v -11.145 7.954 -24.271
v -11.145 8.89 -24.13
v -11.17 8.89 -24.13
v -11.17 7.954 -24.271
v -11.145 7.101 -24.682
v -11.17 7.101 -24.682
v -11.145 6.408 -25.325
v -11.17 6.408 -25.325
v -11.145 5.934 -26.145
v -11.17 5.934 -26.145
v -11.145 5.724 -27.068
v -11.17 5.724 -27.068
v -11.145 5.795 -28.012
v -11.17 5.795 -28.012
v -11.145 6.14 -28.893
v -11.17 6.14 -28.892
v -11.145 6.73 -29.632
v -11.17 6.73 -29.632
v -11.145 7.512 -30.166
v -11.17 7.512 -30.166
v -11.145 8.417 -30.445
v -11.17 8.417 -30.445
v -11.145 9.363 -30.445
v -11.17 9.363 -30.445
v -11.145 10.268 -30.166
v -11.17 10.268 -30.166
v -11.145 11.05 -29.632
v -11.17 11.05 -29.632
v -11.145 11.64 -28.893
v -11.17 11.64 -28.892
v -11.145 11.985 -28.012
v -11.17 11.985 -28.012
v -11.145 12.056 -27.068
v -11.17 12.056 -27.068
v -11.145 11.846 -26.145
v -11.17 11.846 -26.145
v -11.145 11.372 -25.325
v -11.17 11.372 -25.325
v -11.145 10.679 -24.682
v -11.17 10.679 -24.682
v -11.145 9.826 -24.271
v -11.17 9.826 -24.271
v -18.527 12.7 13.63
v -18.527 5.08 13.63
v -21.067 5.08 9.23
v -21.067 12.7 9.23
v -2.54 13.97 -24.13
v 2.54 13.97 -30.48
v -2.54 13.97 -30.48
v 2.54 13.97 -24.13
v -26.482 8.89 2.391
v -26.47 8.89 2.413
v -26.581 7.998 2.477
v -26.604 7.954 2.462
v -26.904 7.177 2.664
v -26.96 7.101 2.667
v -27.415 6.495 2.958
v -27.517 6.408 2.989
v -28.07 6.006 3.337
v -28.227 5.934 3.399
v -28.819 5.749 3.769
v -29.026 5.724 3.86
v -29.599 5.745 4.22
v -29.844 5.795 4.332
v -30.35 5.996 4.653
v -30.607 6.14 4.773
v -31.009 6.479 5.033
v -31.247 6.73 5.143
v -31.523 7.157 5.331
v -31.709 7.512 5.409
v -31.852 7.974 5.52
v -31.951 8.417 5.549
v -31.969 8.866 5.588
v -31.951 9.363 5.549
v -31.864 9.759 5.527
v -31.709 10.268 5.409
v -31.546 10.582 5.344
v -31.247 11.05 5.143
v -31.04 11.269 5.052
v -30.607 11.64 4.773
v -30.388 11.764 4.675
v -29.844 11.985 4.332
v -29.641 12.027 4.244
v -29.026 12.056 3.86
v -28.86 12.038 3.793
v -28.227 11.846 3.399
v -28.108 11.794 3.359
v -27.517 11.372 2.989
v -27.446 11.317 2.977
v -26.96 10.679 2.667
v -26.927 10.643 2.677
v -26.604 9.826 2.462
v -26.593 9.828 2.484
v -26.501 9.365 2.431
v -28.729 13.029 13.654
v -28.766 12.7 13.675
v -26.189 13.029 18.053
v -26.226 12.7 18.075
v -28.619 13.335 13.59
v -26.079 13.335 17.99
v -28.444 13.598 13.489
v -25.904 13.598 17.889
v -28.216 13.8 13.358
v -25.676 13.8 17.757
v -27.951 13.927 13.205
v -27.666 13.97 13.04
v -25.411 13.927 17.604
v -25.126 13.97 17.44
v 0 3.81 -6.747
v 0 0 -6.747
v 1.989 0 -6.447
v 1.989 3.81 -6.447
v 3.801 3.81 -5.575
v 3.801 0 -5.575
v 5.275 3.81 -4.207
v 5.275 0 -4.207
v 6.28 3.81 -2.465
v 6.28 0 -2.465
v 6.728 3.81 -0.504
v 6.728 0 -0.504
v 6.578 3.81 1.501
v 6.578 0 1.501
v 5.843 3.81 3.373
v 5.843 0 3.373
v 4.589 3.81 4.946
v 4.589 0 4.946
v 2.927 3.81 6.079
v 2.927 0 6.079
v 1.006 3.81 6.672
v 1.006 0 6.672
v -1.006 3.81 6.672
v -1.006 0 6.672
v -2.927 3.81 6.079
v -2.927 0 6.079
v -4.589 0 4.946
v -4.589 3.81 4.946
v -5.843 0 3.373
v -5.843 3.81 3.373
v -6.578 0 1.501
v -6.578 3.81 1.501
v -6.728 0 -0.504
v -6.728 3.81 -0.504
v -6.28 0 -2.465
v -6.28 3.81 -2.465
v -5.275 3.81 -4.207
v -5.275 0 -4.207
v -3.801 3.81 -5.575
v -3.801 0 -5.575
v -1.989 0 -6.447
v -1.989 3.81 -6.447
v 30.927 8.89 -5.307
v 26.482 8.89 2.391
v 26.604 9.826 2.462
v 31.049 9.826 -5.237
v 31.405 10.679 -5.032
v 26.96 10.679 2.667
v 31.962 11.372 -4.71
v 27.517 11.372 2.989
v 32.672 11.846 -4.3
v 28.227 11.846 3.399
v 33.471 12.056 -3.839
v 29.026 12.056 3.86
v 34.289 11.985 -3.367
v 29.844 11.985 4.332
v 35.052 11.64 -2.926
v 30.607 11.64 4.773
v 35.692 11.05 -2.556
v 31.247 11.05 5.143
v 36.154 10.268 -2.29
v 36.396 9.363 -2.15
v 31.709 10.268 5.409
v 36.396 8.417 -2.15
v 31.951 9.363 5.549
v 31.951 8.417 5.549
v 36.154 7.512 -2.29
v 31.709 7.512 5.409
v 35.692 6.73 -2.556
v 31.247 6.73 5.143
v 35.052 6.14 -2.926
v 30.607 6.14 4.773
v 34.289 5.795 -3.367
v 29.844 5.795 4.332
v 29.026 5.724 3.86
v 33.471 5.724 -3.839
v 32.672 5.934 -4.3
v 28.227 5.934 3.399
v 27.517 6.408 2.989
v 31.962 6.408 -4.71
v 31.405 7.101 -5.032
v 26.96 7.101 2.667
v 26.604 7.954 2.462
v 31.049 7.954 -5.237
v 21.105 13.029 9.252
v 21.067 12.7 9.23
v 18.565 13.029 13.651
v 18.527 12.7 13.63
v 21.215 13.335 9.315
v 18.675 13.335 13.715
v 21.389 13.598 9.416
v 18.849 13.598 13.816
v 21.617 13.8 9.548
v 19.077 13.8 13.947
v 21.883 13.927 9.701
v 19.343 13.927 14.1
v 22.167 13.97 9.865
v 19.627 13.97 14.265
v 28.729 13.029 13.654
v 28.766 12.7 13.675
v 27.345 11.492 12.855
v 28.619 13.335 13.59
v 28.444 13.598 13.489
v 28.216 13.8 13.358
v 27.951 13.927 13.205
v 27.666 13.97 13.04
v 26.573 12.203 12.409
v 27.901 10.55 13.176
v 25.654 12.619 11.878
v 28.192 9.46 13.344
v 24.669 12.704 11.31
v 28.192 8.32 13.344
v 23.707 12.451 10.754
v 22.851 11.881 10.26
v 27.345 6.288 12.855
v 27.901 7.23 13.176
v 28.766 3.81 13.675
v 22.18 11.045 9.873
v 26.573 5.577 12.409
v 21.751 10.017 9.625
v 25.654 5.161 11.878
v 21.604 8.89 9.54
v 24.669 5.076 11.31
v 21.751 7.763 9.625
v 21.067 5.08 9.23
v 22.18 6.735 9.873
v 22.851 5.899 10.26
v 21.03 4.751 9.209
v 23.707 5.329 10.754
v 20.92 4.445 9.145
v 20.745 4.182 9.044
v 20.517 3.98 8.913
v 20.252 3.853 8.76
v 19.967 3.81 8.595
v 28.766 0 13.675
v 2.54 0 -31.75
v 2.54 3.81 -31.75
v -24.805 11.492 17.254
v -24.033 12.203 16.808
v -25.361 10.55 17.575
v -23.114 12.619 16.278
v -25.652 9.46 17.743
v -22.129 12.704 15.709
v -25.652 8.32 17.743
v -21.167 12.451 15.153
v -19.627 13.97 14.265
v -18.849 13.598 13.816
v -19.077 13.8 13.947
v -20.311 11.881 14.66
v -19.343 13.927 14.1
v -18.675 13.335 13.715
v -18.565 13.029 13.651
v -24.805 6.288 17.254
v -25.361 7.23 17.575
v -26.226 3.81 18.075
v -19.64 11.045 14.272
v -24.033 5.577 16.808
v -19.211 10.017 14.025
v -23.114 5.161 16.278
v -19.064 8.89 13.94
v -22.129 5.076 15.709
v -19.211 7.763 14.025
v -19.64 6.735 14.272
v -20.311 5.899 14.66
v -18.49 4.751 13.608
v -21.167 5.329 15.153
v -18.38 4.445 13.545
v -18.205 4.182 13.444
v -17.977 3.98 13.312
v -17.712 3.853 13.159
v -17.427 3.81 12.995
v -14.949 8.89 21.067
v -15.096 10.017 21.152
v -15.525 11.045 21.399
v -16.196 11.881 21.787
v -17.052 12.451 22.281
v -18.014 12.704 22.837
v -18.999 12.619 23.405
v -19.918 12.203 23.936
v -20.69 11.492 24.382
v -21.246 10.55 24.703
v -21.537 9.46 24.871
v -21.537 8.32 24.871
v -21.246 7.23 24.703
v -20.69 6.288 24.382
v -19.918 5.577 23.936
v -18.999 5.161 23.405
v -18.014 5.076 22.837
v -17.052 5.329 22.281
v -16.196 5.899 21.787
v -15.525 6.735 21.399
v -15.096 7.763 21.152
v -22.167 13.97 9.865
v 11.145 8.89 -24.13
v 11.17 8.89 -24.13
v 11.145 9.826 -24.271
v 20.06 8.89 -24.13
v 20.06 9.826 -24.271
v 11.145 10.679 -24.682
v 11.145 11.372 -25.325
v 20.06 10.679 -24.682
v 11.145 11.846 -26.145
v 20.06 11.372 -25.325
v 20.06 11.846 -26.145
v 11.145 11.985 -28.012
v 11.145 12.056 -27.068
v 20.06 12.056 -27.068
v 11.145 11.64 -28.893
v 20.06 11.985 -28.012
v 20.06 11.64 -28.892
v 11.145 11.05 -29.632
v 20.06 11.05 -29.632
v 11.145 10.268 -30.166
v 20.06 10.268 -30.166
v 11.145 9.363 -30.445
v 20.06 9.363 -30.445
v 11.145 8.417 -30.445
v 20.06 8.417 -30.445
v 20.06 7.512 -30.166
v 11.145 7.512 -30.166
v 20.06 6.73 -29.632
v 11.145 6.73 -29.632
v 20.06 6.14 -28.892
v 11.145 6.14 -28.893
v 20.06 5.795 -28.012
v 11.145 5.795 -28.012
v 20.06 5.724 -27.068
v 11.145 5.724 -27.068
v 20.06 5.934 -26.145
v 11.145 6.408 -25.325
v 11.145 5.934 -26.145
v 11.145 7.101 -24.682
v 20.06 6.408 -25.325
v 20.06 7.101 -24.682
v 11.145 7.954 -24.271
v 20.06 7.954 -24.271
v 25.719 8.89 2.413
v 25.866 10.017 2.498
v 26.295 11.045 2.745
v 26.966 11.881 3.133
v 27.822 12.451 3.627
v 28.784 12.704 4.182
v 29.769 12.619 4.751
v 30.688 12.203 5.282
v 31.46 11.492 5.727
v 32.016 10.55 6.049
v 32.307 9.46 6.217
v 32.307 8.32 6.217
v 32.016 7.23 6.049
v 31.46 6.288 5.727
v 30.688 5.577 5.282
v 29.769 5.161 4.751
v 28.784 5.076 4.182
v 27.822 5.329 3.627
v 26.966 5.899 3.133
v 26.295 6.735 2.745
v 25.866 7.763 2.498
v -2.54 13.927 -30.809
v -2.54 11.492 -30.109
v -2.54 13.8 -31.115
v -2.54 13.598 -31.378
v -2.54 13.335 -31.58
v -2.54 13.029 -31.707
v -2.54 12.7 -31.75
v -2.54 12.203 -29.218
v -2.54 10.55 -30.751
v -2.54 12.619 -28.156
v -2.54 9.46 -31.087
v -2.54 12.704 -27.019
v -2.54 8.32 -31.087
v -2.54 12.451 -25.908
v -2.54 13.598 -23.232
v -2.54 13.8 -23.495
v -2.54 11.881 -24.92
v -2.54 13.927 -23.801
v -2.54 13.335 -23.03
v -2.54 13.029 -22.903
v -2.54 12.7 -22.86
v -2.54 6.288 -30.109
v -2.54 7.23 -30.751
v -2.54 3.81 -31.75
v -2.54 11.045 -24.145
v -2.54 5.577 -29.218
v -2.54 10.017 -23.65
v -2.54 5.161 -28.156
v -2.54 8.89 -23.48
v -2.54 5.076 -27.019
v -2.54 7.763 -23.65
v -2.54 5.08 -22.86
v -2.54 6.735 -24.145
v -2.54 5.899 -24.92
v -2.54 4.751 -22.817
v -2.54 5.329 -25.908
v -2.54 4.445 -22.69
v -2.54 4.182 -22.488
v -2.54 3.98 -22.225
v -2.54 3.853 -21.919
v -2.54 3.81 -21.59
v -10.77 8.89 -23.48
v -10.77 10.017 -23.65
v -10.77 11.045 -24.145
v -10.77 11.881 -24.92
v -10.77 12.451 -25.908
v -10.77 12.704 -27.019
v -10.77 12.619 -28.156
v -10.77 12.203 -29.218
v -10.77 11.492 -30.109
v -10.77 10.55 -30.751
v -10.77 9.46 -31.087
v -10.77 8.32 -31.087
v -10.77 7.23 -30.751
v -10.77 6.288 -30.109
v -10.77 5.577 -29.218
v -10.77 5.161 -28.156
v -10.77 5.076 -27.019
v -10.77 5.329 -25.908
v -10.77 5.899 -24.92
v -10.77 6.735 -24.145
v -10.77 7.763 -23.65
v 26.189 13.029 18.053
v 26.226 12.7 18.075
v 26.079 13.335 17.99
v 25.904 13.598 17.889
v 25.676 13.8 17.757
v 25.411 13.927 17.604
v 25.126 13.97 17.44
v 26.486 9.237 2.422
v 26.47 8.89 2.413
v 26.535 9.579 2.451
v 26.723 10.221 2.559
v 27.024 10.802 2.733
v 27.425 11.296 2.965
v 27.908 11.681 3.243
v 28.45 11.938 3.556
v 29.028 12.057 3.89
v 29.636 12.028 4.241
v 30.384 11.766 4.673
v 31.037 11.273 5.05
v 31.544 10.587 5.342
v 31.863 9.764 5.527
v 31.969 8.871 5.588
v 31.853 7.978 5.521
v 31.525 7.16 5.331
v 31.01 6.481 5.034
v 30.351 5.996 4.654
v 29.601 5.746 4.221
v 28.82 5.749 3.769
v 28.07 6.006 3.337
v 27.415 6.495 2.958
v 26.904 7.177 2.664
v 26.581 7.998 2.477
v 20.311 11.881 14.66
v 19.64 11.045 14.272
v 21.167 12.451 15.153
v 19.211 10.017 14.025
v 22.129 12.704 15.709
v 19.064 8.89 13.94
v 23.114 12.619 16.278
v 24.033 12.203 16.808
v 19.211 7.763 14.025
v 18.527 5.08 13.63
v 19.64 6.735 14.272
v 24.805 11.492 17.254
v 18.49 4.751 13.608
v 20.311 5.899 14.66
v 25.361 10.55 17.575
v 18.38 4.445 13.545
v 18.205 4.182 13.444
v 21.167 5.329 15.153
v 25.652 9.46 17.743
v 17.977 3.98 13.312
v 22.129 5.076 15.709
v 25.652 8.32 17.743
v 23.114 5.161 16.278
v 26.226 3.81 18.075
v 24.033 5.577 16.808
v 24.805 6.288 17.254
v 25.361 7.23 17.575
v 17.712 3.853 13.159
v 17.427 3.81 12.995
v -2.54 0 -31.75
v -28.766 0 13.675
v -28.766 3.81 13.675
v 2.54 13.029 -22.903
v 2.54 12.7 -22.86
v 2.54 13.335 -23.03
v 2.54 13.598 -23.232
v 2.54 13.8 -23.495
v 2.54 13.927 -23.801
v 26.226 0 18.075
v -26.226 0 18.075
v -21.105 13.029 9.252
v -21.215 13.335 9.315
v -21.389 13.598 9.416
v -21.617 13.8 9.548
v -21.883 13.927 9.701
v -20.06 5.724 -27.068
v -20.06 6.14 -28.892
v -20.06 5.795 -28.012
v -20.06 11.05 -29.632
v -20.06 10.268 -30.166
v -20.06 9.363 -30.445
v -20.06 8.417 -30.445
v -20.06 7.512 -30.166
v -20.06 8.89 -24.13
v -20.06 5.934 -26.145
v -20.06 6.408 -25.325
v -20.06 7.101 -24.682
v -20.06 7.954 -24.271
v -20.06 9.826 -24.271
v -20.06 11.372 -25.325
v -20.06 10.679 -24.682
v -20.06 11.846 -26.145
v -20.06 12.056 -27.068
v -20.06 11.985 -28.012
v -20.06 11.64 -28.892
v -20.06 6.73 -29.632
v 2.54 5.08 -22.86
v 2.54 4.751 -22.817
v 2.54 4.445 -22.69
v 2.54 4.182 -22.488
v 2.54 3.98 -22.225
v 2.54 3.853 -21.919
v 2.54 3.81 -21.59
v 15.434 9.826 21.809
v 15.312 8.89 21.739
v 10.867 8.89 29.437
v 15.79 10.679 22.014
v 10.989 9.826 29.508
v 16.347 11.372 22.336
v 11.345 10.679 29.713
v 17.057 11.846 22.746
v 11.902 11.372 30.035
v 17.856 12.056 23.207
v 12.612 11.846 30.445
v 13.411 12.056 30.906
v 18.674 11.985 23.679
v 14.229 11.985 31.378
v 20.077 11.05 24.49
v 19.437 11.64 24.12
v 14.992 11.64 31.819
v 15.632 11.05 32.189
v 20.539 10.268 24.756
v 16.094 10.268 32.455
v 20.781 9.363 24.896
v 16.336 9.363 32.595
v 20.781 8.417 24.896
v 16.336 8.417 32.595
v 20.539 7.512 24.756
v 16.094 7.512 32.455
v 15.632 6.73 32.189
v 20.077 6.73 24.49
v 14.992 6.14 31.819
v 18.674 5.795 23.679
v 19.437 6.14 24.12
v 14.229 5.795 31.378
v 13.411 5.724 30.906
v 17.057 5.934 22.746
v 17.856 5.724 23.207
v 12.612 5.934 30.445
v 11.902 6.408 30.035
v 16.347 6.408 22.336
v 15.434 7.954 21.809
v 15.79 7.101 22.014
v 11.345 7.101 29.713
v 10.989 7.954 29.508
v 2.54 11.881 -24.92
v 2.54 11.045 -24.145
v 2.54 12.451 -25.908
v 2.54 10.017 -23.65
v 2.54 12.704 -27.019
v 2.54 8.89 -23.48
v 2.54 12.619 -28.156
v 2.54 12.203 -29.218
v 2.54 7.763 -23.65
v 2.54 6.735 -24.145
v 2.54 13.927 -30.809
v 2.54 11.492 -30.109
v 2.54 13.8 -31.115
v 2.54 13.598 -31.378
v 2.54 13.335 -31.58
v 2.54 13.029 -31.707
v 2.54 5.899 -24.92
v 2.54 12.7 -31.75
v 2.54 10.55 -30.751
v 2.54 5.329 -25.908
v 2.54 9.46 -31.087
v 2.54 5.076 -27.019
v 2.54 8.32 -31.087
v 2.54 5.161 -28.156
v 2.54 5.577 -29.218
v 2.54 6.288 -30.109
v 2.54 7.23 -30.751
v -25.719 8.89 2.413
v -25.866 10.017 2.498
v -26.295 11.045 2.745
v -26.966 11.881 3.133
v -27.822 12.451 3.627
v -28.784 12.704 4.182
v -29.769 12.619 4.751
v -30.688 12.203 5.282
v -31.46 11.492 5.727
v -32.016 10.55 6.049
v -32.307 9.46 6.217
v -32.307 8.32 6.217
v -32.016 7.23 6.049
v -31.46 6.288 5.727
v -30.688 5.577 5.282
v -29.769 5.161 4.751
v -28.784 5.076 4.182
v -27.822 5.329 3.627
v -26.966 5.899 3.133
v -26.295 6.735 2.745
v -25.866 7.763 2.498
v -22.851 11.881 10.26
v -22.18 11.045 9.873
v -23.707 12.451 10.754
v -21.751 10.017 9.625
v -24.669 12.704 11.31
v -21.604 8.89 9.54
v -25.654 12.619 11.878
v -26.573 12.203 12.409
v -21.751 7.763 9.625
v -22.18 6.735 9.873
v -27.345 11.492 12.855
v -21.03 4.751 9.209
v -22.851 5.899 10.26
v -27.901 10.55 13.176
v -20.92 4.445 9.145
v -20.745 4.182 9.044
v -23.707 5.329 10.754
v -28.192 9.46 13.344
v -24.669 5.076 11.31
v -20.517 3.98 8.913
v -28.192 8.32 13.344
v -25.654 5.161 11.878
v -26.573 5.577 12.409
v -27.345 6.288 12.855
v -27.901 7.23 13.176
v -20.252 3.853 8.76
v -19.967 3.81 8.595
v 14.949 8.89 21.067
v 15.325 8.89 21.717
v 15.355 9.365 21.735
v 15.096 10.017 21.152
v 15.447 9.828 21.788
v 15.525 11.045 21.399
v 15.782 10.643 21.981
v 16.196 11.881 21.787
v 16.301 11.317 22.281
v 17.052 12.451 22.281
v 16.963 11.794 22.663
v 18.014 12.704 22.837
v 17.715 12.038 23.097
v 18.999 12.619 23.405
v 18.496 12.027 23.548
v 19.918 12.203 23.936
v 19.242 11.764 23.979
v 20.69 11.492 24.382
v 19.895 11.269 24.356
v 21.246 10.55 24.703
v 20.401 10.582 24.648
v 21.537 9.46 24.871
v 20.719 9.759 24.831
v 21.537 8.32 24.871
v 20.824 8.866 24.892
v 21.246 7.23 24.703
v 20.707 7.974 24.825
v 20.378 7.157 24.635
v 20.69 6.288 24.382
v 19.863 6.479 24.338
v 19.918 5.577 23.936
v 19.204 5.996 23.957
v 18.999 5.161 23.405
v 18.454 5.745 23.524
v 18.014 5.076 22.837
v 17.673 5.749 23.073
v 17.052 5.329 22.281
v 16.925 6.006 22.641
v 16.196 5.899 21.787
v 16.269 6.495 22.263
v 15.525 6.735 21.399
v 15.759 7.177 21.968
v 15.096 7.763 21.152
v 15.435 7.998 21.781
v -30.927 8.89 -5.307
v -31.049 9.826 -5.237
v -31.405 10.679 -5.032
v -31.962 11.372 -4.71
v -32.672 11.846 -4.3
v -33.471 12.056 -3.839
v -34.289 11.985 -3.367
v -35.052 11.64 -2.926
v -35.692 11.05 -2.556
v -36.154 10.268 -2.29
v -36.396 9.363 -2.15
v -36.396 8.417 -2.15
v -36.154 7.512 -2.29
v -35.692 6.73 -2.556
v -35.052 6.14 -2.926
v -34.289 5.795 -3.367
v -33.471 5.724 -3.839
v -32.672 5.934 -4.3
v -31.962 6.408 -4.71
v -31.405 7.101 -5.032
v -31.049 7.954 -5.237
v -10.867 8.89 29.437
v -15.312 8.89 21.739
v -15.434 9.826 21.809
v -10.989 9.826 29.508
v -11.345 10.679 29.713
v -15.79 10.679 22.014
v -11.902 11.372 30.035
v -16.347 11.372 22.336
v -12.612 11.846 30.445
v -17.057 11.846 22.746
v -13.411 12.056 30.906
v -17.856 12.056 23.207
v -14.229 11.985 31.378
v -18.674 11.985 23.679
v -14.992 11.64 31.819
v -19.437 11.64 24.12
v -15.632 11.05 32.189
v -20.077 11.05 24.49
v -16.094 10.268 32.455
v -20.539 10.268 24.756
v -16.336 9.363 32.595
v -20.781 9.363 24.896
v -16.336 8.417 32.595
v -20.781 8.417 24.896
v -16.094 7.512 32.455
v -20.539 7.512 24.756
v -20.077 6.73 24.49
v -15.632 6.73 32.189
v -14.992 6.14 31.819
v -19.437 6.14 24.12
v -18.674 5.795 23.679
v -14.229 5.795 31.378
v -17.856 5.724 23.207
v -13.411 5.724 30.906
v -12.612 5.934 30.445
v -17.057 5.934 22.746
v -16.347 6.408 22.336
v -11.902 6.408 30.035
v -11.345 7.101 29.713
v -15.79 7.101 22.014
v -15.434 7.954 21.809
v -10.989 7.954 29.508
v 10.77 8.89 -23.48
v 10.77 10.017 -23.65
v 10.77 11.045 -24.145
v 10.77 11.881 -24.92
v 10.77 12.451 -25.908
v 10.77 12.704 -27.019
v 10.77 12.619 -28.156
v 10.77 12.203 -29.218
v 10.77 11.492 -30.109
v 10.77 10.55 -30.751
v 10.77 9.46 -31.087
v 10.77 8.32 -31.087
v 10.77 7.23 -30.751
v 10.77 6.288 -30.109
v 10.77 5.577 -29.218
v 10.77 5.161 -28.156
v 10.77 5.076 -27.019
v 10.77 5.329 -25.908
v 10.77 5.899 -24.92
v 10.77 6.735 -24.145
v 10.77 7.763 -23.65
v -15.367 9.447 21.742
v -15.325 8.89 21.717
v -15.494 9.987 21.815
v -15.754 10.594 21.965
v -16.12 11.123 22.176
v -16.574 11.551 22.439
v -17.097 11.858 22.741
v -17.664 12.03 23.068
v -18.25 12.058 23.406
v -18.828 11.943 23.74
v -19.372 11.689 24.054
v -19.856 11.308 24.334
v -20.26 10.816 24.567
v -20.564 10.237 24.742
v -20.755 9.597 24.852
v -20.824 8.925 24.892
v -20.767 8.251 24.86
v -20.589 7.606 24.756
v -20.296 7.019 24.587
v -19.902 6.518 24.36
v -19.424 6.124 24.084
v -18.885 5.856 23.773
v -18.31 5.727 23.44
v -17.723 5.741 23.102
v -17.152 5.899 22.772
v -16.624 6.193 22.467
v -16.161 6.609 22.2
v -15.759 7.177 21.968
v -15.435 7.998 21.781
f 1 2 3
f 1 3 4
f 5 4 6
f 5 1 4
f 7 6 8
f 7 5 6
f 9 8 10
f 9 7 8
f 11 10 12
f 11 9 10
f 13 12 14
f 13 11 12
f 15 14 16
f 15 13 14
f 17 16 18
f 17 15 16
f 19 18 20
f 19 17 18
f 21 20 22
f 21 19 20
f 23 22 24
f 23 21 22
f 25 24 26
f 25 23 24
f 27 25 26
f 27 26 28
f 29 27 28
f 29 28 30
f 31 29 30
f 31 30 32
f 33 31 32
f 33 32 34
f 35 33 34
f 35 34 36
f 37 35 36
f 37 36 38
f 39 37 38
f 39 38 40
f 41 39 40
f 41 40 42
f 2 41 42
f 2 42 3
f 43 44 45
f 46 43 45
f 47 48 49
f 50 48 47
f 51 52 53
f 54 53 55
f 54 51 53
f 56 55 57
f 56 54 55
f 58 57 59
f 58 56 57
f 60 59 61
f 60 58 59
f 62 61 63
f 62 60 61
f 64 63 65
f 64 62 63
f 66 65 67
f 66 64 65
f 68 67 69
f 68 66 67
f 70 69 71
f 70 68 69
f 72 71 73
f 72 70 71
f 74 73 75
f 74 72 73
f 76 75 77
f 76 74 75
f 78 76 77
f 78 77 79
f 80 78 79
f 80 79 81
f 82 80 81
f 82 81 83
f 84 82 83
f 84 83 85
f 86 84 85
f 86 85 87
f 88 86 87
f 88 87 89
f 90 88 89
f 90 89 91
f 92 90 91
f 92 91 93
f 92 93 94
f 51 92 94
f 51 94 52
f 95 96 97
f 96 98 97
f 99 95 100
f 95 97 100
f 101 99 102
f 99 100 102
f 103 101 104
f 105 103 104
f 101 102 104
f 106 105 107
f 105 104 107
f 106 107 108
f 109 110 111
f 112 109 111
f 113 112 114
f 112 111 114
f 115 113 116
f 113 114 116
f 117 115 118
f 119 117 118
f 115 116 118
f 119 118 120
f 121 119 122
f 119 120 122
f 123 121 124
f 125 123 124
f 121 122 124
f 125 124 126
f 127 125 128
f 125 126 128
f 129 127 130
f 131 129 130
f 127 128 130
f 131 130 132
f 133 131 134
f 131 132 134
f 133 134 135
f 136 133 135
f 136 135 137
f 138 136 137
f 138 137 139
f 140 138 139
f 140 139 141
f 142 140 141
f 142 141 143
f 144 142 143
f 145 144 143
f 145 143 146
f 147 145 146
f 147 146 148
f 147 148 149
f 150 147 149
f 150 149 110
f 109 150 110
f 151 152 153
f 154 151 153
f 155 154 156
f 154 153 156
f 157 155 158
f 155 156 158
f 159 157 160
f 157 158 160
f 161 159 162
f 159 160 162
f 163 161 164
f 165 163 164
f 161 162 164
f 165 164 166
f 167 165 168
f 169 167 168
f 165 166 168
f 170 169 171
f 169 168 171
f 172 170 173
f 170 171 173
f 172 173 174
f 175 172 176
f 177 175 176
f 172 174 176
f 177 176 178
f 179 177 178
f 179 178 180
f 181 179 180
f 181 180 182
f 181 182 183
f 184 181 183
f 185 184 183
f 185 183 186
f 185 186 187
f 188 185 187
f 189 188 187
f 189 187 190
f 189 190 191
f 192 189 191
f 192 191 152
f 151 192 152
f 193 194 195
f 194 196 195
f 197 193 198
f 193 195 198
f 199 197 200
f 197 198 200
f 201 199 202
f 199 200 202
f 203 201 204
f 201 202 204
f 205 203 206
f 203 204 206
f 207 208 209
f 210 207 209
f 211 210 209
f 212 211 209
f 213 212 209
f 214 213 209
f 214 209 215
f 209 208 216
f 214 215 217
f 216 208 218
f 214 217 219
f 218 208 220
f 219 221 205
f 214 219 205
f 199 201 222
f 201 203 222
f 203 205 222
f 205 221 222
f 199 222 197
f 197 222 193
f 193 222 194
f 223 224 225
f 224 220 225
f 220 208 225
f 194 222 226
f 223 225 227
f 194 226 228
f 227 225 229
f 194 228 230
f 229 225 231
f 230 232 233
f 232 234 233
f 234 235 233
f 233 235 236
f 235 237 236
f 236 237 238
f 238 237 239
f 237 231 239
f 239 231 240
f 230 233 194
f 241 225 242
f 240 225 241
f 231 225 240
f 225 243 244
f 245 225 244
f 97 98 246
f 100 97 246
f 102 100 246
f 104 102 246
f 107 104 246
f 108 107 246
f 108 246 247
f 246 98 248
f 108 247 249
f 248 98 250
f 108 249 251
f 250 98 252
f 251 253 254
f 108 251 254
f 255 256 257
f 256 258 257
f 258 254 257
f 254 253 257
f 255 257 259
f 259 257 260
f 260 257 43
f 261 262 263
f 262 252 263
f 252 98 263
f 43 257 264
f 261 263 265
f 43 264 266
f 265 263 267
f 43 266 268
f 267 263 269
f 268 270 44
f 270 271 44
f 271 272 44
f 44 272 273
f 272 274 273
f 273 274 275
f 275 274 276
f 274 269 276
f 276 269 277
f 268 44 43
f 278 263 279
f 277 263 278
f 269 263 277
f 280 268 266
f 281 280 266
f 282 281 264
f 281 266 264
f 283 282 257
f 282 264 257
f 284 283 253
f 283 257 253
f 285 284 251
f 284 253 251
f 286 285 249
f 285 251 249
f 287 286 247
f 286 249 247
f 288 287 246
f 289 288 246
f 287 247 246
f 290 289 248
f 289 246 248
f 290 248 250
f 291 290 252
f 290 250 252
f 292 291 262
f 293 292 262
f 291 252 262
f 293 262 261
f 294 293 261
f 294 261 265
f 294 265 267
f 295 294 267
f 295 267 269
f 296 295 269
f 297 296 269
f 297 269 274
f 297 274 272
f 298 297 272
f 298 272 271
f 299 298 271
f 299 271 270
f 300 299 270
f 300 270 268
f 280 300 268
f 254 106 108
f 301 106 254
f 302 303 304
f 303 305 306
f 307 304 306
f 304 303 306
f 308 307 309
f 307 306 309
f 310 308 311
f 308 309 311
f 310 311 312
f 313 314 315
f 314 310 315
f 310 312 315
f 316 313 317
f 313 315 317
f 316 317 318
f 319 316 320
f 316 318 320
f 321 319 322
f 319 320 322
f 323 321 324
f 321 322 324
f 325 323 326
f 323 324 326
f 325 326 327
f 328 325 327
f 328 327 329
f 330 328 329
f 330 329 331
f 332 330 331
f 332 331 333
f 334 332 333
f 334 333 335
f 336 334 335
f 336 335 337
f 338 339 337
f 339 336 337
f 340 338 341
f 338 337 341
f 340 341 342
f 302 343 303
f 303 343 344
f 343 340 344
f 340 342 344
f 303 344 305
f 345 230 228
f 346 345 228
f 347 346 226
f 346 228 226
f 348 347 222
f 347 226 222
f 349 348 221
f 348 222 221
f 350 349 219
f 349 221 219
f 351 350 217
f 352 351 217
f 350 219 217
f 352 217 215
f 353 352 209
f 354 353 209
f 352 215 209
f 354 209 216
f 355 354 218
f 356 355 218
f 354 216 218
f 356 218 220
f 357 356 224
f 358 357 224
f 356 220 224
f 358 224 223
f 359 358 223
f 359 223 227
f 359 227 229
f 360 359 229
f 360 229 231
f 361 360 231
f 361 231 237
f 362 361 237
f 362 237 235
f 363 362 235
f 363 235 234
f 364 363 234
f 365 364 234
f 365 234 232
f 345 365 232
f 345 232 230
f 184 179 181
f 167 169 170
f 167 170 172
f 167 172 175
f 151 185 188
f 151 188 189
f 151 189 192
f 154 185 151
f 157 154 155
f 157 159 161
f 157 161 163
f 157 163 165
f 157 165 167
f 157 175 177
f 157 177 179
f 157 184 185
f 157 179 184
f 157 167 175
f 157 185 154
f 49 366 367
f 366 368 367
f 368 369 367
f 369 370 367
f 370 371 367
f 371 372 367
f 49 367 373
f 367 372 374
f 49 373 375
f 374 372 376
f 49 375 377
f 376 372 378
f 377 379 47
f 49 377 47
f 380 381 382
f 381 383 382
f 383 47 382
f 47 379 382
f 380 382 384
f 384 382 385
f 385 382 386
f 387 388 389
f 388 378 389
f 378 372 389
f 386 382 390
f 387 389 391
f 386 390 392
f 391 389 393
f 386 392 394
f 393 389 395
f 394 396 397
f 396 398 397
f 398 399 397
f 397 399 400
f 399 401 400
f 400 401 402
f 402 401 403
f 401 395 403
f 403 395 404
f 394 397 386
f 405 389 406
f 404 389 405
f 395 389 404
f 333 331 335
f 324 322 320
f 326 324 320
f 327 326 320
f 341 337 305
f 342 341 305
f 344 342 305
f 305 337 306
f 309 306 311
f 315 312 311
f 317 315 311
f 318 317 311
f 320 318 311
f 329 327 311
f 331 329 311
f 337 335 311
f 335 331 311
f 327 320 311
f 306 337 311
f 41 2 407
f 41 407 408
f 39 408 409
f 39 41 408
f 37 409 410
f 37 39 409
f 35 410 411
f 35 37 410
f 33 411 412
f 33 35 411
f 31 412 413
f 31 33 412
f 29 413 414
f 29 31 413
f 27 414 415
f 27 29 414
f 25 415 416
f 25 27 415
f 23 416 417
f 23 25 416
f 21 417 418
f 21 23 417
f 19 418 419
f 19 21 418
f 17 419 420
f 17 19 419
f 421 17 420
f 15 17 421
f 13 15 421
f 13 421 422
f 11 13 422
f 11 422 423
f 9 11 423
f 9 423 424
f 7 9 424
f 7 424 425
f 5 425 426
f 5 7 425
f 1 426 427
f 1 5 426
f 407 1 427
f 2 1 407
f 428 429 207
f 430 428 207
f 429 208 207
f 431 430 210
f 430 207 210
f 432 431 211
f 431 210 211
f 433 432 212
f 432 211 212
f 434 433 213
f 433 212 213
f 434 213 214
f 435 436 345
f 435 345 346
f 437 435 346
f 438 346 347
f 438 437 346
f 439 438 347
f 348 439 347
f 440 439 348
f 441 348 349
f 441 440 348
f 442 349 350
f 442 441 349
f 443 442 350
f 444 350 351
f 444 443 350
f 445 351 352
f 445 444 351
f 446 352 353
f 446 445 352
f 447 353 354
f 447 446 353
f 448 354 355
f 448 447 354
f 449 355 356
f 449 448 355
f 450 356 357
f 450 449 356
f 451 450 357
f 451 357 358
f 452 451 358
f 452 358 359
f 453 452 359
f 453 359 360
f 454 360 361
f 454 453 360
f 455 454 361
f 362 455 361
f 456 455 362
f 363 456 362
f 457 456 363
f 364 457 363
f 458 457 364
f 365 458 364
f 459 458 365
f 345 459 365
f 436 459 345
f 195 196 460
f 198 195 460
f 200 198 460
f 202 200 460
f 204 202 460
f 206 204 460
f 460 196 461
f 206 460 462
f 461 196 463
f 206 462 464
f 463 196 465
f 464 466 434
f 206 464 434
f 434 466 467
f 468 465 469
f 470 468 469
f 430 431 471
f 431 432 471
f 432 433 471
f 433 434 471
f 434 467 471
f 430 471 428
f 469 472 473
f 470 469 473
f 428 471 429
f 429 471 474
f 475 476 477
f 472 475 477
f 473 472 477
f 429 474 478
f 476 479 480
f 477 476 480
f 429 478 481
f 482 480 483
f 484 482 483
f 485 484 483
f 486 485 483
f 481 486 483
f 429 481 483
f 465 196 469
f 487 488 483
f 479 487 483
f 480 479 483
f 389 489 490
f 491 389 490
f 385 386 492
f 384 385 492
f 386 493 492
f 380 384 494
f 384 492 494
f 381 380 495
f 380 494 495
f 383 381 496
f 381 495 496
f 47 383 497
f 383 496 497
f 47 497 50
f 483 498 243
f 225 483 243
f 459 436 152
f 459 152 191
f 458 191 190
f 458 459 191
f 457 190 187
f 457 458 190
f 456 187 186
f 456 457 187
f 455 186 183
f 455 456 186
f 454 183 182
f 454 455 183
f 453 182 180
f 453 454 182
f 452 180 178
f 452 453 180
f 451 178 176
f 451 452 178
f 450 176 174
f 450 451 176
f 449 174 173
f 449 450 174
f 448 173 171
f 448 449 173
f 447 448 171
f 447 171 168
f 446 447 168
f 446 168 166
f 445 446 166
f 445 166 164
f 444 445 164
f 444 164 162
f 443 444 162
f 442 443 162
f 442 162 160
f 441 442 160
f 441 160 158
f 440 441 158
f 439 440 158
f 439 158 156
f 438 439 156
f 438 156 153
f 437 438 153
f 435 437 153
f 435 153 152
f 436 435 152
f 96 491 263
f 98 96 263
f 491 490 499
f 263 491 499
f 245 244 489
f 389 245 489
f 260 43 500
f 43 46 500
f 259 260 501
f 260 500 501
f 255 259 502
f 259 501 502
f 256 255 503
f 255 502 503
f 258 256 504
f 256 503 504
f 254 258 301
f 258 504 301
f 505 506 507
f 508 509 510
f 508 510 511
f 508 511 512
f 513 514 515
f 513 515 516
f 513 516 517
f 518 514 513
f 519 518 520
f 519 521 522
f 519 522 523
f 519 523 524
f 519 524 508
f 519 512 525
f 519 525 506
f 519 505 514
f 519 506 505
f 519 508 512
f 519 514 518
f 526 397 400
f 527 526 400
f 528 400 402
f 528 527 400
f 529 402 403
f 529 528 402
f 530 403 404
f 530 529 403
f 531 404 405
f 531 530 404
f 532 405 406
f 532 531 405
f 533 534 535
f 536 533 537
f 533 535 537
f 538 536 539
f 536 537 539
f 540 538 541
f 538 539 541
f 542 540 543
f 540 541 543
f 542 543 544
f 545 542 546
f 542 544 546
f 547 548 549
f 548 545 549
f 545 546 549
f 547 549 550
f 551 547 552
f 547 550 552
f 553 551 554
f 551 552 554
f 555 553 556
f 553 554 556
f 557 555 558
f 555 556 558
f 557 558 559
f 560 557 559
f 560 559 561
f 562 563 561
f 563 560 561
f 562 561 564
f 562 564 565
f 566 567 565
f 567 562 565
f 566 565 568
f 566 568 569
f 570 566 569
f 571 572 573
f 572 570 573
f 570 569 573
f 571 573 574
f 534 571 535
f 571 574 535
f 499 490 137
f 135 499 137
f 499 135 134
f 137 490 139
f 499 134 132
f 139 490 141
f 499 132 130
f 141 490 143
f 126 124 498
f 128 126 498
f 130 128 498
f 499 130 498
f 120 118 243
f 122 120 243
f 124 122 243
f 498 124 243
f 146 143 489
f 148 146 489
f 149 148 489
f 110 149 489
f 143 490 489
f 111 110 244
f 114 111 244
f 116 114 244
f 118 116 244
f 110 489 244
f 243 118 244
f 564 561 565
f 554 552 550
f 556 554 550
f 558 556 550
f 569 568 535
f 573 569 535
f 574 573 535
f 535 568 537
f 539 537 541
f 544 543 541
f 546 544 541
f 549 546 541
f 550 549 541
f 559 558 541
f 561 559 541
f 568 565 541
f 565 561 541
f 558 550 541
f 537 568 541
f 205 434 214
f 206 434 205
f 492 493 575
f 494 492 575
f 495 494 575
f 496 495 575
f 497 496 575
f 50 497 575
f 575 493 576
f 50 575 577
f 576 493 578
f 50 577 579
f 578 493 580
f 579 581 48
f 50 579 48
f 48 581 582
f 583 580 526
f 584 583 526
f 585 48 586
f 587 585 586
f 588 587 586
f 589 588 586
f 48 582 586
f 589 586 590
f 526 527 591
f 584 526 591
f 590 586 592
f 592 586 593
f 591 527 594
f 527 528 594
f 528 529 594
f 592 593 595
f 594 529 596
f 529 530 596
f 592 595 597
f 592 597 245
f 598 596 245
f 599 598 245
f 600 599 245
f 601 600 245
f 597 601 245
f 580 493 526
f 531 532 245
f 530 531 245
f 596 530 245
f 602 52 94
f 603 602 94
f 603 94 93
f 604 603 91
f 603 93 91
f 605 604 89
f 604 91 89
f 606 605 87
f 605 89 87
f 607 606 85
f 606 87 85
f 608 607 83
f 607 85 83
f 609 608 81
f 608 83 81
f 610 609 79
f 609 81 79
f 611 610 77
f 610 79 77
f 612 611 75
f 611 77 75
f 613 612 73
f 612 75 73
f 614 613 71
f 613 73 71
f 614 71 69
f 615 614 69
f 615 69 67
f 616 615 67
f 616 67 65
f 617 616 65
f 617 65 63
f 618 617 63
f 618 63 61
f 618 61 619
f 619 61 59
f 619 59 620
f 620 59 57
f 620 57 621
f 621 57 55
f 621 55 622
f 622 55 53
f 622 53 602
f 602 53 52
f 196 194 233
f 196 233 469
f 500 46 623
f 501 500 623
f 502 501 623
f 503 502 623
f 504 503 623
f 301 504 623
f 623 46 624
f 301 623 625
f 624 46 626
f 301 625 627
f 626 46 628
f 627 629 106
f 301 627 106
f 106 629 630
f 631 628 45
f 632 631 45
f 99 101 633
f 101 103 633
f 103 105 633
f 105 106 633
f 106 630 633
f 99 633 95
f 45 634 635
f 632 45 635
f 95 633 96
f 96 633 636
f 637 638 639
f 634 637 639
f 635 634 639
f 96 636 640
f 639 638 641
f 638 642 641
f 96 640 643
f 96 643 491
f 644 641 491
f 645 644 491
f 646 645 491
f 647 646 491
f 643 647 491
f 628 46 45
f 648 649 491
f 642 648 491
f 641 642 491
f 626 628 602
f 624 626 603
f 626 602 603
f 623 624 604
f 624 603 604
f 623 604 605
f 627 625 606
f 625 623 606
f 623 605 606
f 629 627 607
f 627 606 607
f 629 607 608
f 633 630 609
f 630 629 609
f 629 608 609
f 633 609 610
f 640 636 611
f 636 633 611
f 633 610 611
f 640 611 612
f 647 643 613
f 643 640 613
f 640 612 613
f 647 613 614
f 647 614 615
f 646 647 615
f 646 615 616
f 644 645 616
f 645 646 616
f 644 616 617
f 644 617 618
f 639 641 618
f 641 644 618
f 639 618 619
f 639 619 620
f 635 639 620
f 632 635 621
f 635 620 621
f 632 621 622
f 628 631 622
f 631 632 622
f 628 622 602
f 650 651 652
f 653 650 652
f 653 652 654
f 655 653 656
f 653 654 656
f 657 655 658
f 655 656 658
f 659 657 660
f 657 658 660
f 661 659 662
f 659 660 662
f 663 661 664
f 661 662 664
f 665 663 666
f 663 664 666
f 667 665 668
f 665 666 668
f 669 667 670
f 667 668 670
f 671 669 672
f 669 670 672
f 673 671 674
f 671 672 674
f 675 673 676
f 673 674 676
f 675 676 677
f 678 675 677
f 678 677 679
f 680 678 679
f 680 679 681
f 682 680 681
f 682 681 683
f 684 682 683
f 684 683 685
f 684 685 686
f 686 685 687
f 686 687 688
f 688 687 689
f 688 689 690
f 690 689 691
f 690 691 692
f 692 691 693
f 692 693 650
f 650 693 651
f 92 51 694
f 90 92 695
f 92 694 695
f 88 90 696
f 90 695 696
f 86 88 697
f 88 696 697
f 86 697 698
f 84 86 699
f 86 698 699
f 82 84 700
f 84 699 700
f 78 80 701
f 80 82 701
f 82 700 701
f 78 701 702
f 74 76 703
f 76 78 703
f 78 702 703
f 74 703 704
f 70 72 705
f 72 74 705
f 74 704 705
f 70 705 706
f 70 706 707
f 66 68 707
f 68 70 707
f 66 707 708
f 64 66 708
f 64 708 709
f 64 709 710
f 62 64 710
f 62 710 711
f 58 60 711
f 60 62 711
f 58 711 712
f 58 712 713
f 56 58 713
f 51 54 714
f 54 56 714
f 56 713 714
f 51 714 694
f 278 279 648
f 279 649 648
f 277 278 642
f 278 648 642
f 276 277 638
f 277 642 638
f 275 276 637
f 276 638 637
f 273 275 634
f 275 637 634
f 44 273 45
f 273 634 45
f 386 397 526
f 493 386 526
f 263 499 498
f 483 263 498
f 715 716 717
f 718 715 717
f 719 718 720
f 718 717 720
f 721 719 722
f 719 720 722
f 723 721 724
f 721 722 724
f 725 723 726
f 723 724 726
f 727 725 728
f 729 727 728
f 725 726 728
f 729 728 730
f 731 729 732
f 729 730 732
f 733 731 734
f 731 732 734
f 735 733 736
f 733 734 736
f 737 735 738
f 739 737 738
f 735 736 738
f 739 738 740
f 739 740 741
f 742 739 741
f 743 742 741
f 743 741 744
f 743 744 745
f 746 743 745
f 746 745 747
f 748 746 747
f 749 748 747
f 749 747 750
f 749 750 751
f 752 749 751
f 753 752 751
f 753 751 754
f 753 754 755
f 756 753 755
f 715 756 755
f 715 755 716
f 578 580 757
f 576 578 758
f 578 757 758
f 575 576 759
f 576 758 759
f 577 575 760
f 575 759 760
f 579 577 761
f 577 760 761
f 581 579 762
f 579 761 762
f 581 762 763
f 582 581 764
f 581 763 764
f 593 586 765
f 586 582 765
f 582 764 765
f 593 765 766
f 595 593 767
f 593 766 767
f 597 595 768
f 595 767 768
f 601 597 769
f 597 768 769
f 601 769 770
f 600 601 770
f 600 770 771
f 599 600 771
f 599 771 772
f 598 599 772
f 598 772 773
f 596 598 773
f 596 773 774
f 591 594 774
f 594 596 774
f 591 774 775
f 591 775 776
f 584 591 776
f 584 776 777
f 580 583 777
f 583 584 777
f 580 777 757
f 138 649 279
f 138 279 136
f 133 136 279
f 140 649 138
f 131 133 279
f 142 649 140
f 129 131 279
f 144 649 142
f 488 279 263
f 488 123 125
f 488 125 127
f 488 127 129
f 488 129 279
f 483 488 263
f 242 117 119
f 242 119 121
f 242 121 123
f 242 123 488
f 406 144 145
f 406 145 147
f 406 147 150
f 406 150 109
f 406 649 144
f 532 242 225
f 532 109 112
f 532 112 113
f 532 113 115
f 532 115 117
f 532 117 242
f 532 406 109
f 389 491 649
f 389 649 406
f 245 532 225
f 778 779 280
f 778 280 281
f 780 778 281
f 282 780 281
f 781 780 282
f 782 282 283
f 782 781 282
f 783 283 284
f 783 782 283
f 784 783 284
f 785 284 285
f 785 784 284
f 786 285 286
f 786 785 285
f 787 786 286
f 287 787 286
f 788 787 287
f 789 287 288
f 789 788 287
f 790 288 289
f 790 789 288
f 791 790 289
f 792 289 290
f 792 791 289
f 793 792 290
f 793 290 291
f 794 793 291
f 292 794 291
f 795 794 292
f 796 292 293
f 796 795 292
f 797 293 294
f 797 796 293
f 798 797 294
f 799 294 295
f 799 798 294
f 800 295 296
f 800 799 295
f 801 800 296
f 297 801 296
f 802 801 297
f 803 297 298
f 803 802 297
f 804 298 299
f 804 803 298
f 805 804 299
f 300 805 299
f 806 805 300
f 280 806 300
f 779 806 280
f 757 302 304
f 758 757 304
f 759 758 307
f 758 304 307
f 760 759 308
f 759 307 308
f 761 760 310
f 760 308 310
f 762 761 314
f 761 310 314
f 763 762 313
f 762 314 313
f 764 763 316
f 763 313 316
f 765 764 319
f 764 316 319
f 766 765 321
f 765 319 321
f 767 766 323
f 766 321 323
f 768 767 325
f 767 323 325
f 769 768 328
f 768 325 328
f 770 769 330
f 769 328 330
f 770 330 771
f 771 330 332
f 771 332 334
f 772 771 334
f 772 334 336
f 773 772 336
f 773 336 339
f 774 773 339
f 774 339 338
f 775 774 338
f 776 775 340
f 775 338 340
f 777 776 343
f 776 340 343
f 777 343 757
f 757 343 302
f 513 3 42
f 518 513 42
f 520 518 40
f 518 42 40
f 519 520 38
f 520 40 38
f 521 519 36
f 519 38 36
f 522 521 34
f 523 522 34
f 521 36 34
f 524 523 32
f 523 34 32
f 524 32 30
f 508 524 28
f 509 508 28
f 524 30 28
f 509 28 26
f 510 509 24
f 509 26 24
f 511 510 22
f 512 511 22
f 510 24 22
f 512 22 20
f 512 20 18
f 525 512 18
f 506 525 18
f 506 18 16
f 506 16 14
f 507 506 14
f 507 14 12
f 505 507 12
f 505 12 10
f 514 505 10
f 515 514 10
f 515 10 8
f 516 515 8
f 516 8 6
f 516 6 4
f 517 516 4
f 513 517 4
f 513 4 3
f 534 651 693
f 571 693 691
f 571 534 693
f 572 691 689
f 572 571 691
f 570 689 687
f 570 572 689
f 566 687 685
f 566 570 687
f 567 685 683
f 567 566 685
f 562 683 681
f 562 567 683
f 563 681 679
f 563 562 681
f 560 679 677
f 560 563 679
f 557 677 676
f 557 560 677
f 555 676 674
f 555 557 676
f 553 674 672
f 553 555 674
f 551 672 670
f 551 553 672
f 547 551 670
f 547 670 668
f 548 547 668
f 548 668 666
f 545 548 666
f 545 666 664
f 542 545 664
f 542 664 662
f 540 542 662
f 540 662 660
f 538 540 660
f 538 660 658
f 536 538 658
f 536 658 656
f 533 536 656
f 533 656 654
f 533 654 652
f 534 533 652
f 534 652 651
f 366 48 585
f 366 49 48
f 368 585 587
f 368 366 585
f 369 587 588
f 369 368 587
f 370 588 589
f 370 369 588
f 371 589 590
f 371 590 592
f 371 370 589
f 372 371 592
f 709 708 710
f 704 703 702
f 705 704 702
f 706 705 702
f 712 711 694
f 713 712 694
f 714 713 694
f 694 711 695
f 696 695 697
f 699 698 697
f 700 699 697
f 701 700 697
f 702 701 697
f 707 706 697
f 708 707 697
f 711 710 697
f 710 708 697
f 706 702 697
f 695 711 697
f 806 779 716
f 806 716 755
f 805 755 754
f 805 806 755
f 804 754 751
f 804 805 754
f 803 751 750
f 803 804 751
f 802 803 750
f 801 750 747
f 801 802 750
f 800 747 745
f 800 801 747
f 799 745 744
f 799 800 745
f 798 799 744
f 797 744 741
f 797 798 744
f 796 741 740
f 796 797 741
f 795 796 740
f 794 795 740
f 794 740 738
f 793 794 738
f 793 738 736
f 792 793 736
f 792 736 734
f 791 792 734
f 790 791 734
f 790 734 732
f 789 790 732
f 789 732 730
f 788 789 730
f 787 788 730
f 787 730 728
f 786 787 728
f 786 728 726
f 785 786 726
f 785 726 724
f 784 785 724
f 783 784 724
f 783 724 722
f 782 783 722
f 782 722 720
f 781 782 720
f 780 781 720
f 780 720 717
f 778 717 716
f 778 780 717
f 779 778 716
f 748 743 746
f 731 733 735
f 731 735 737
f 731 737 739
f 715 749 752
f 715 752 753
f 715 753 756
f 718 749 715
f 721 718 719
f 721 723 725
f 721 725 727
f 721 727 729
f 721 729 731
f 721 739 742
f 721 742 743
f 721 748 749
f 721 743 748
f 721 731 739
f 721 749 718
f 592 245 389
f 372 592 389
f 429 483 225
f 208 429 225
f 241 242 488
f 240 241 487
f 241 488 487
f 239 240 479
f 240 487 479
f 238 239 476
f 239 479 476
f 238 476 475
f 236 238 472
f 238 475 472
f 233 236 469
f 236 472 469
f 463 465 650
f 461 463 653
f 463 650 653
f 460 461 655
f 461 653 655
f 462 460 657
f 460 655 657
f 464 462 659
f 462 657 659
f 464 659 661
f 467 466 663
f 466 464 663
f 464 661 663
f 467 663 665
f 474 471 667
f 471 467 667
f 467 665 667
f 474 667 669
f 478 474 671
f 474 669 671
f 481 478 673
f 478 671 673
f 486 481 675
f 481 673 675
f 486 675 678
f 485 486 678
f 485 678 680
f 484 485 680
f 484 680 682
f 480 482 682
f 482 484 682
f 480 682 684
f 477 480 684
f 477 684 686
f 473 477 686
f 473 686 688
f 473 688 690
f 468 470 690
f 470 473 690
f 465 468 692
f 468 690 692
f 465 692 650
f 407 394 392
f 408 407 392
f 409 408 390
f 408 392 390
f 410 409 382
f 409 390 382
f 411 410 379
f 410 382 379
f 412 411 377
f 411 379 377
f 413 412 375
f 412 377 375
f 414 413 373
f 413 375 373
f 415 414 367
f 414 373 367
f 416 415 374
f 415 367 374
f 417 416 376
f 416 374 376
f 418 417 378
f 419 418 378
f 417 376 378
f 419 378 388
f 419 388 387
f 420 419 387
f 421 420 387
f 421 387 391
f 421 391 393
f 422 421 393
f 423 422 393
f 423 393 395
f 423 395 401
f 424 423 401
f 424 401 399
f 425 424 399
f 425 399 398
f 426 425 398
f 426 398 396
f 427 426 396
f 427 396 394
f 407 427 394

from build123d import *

# Parameters (mm, degrees)
BOSS_EXTRUDE1_DEPTH              = 3.81
F_17_32_0_53125_DIAMETER_HOLE1_D = 13.49375
BOSS_EXTRUDE2_DEPTH              = 10.16
CIRPATTERN19_COUNT               = 3
BOSS_EXTRUDE3_START              = -13.71
SKETCH6_R                        = 3.825
BOSS_EXTRUDE3_DEPTH              = 22.34
BOSS_EXTRUDE4_START              = -31.23
SKETCH7_R                        = 3.175
BOSS_EXTRUDE4_DEPTH              = 40.12
CIRPATTERN21_COUNT               = 3
CIRPATTERN28_COUNT               = 3
CHAMFER3_SIZE                    = 0.4
CHAMFER3_SIZE_2                  = 0.692820323
FILLET4_R                        = 1.27


with BuildPart() as part:
    # Sketch1 → Boss-Extrude1 (new body)
    with BuildSketch(Plane(origin=(0, 0, 0), x_dir=(1, 0, 0), z_dir=(0, 1, 0))):
        Polygon((2.54, 31.75), (-2.54, 31.75), (-28.76630657, -13.675295474), (-26.22630657, -18.074704526), (26.22630657, -18.074704526), (28.76630657, -13.675295474), align=None)
    extrude(amount=BOSS_EXTRUDE1_DEPTH)

    # 17/32 (0.53125) Diameter Hole1 (through all)
    with Locations(Plane(origin=(-6.6e-08, 3.81, -3.86e-07), x_dir=(0, 0, 1), z_dir=(0, 1, 0))):
        with Locations((0, 0)):
            Hole(F_17_32_0_53125_DIAMETER_HOLE1_D / 2)

    # Sketch5 → Boss-Extrude2 (add)
    with BuildSketch(Plane(origin=(0, 3.81, 0), x_dir=(1, 0, 0), z_dir=(0, 1, 0))):
        Polygon((-21.067340731, -9.230295474), (-28.76630657, -13.675295474), (-26.22630657, -18.074704526), (-18.527340731, -13.629704526), align=None)
    boss_extrude2 = extrude(amount=BOSS_EXTRUDE2_DEPTH)

    # CirPattern19: Boss-Extrude2 ×3 about axis
    cirpattern19_axis = Axis((0, 0, 0), (0, 1, 0))
    for i in range(1, CIRPATTERN19_COUNT):
        add(boss_extrude2.rotate(cirpattern19_axis, i * 360 / CIRPATTERN19_COUNT))

    # Sketch6 → Boss-Extrude3 (add)
    with BuildSketch(Plane(origin=(1.27, 0, 2.199704526), x_dir=(0.8660254037844383, 0, -0.5000000000000007), z_dir=(0.5000000000000007, 0, 0.8660254037844383)).offset(BOSS_EXTRUDE3_START)):
        with Locations((-27.305, 8.89)):
            Circle(SKETCH6_R)
    boss_extrude3 = extrude(amount=BOSS_EXTRUDE3_DEPTH)

    # Sketch7 → Boss-Extrude4 (add)
    with BuildSketch(Plane(origin=(5.585, 0, 9.67350376), x_dir=(0.8660254037844384, 0, -0.5000000000000007), z_dir=(0.5000000000000007, 0, 0.8660254037844384)).offset(BOSS_EXTRUDE4_START)):
        with Locations((-27.305, 8.89)):
            Circle(SKETCH7_R)
    boss_extrude4 = extrude(amount=BOSS_EXTRUDE4_DEPTH)

    # CirPattern21: Boss-Extrude3 ×3 about axis
    cirpattern21_axis = Axis((0, 0, 0), (0, 1, 0))
    for i in range(1, CIRPATTERN21_COUNT):
        add(boss_extrude3.rotate(cirpattern21_axis, i * 360 / CIRPATTERN21_COUNT))

    # CirPattern28: Boss-Extrude4 ×3 about axis
    cirpattern28_axis = Axis((0, 0, 0), (0, 1, 0))
    for i in range(1, CIRPATTERN28_COUNT):
        add(boss_extrude4.rotate(cirpattern28_axis, i * 360 / CIRPATTERN28_COUNT))

    # Chamfer3
    # the kernel refuses this chamfer: 0.692820323, 0.4 mm, written as the material it takes off along each edge
    with BuildSketch(Plane(origin=(-18.06182365, 8.89, 23.32600376), x_dir=(0.8660254037844383, 0, -0.5000000000000004), z_dir=(0, -1, 0))) as chamfer3_piece_1_section:
        Polygon((3.825, -CHAMFER3_SIZE), (3.825 - CHAMFER3_SIZE_2, 0), (3.825, 0), align=None)
    chamfer3_piece_1 = revolve(axis=Axis((-18.06182365, 8.89, 23.32600376), (0.5000000000000007, 0, 0.8660254037844383)), mode=Mode.PRIVATE)
    chamfer3_piece_1 = chamfer3_piece_1 - Plane(origin=(-18.164887991, 8.89, 23.147491086), x_dir=(0.8660254037844384, 0, -0.5000000000000007), z_dir=(-0.5000000000000007, 0, -0.8660254037844384)) * Cylinder(3.175, 16, mode=Mode.PRIVATE)
    add(chamfer3_piece_1, mode=Mode.SUBTRACT)
    with BuildSketch(Plane(origin=(-11.17, 8.89, -27.305), x_dir=(0, 0, 1), z_dir=(0, -1, 0))) as chamfer3_piece_2_section:
        Polygon((3.825, -CHAMFER3_SIZE), (3.825 - CHAMFER3_SIZE_2, 0), (3.825, 0), align=None)
    chamfer3_piece_2 = revolve(axis=Axis((-11.17, 8.89, -27.305), (-1, 0, 0)), mode=Mode.PRIVATE)
    chamfer3_piece_2 = chamfer3_piece_2 - Plane(origin=(-10.963871319, 8.89, -27.305), x_dir=(0, 0, 1), z_dir=(1, 0, 0)) * Cylinder(3.175, 16, mode=Mode.PRIVATE)
    add(chamfer3_piece_2, mode=Mode.SUBTRACT)
    with BuildSketch(Plane(origin=(11.17, 8.89, -27.305), x_dir=(0, 0, 1), z_dir=(0, -1, 0))) as chamfer3_piece_3_section:
        Polygon((3.825, CHAMFER3_SIZE), (3.825 - CHAMFER3_SIZE_2, 0), (3.825, 0), align=None)
    chamfer3_piece_3 = revolve(axis=Axis((11.17, 8.89, -27.305), (-1, 0, 0)), mode=Mode.PRIVATE)
    chamfer3_piece_3 = chamfer3_piece_3 - Plane(origin=(10.963871319, 8.89, -27.305), x_dir=(0, 0, 1), z_dir=(1, 0, 0)) * Cylinder(3.175, 16, mode=Mode.PRIVATE)
    add(chamfer3_piece_3, mode=Mode.SUBTRACT)
    with BuildSketch(Plane(origin=(29.23182365, 8.89, 3.97899624), x_dir=(-0.8660254037844392, 0, -0.49999999999999906), z_dir=(0, -1, 0))) as chamfer3_piece_4_section:
        Polygon((3.825, -CHAMFER3_SIZE), (3.825 - CHAMFER3_SIZE_2, 0), (3.825, 0), align=None)
    chamfer3_piece_4 = revolve(axis=Axis((29.23182365, 8.89, 3.97899624), (0.4999999999999995, 0, -0.8660254037844389)), mode=Mode.PRIVATE)
    chamfer3_piece_4 = chamfer3_piece_4 - Plane(origin=(29.12875931, 8.89, 4.157508914), x_dir=(-0.8660254037844389, 0, -0.49999999999999956), z_dir=(-0.49999999999999956, 0, 0.8660254037844389)) * Cylinder(3.175, 16, mode=Mode.PRIVATE)
    add(chamfer3_piece_4, mode=Mode.SUBTRACT)
    with BuildSketch(Plane(origin=(18.06182365, 8.89, 23.32600376), x_dir=(-0.8660254037844394, 0, -0.49999999999999895), z_dir=(0, -1, 0))) as chamfer3_piece_5_section:
        Polygon((3.825, CHAMFER3_SIZE), (3.825 - CHAMFER3_SIZE_2, 0), (3.825, 0), align=None)
    chamfer3_piece_5 = revolve(axis=Axis((18.06182365, 8.89, 23.32600376), (0.4999999999999995, 0, -0.8660254037844389)), mode=Mode.PRIVATE)
    chamfer3_piece_5 = chamfer3_piece_5 - Plane(origin=(18.164887991, 8.89, 23.147491086), x_dir=(-0.8660254037844389, 0, -0.49999999999999956), z_dir=(-0.49999999999999956, 0, 0.8660254037844389)) * Cylinder(3.175, 16, mode=Mode.PRIVATE)
    add(chamfer3_piece_5, mode=Mode.SUBTRACT)
    with BuildSketch(Plane(origin=(-29.23182365, 8.89, 3.97899624), x_dir=(0.8660254037844383, 0, -0.5000000000000004), z_dir=(0, -1, 0))) as chamfer3_piece_6_section:
        Polygon((3.825, CHAMFER3_SIZE), (3.825 - CHAMFER3_SIZE_2, 0), (3.825, 0), align=None)
    chamfer3_piece_6 = revolve(axis=Axis((-29.23182365, 8.89, 3.97899624), (0.5000000000000007, 0, 0.8660254037844383)), mode=Mode.PRIVATE)
    chamfer3_piece_6 = chamfer3_piece_6 - Plane(origin=(-29.12875931, 8.89, 4.157508914), x_dir=(0.8660254037844384, 0, -0.5000000000000007), z_dir=(-0.5000000000000007, 0, -0.8660254037844384)) * Cylinder(3.175, 16, mode=Mode.PRIVATE)
    add(chamfer3_piece_6, mode=Mode.SUBTRACT)

    # Fillet4
    fillet4_edges = [part.edges().sort_by_distance(p)[0] for p in [
        (-19.797340731, 3.81, 11.43),
        (-27.49630657, 13.97, 15.875),
        (-19.797340731, 13.97, 11.43),
        (19.797340731, 3.81, 11.43),
        (27.49630657, 13.97, 15.875),
        (19.797340731, 13.97, 11.43),
        (0, 3.81, -22.86),
        (0, 13.97, -31.75),
        (0, 13.97, -22.86),
    ]]
    fillet(fillet4_edges, radius=FILLET4_R)


solid = part.part
